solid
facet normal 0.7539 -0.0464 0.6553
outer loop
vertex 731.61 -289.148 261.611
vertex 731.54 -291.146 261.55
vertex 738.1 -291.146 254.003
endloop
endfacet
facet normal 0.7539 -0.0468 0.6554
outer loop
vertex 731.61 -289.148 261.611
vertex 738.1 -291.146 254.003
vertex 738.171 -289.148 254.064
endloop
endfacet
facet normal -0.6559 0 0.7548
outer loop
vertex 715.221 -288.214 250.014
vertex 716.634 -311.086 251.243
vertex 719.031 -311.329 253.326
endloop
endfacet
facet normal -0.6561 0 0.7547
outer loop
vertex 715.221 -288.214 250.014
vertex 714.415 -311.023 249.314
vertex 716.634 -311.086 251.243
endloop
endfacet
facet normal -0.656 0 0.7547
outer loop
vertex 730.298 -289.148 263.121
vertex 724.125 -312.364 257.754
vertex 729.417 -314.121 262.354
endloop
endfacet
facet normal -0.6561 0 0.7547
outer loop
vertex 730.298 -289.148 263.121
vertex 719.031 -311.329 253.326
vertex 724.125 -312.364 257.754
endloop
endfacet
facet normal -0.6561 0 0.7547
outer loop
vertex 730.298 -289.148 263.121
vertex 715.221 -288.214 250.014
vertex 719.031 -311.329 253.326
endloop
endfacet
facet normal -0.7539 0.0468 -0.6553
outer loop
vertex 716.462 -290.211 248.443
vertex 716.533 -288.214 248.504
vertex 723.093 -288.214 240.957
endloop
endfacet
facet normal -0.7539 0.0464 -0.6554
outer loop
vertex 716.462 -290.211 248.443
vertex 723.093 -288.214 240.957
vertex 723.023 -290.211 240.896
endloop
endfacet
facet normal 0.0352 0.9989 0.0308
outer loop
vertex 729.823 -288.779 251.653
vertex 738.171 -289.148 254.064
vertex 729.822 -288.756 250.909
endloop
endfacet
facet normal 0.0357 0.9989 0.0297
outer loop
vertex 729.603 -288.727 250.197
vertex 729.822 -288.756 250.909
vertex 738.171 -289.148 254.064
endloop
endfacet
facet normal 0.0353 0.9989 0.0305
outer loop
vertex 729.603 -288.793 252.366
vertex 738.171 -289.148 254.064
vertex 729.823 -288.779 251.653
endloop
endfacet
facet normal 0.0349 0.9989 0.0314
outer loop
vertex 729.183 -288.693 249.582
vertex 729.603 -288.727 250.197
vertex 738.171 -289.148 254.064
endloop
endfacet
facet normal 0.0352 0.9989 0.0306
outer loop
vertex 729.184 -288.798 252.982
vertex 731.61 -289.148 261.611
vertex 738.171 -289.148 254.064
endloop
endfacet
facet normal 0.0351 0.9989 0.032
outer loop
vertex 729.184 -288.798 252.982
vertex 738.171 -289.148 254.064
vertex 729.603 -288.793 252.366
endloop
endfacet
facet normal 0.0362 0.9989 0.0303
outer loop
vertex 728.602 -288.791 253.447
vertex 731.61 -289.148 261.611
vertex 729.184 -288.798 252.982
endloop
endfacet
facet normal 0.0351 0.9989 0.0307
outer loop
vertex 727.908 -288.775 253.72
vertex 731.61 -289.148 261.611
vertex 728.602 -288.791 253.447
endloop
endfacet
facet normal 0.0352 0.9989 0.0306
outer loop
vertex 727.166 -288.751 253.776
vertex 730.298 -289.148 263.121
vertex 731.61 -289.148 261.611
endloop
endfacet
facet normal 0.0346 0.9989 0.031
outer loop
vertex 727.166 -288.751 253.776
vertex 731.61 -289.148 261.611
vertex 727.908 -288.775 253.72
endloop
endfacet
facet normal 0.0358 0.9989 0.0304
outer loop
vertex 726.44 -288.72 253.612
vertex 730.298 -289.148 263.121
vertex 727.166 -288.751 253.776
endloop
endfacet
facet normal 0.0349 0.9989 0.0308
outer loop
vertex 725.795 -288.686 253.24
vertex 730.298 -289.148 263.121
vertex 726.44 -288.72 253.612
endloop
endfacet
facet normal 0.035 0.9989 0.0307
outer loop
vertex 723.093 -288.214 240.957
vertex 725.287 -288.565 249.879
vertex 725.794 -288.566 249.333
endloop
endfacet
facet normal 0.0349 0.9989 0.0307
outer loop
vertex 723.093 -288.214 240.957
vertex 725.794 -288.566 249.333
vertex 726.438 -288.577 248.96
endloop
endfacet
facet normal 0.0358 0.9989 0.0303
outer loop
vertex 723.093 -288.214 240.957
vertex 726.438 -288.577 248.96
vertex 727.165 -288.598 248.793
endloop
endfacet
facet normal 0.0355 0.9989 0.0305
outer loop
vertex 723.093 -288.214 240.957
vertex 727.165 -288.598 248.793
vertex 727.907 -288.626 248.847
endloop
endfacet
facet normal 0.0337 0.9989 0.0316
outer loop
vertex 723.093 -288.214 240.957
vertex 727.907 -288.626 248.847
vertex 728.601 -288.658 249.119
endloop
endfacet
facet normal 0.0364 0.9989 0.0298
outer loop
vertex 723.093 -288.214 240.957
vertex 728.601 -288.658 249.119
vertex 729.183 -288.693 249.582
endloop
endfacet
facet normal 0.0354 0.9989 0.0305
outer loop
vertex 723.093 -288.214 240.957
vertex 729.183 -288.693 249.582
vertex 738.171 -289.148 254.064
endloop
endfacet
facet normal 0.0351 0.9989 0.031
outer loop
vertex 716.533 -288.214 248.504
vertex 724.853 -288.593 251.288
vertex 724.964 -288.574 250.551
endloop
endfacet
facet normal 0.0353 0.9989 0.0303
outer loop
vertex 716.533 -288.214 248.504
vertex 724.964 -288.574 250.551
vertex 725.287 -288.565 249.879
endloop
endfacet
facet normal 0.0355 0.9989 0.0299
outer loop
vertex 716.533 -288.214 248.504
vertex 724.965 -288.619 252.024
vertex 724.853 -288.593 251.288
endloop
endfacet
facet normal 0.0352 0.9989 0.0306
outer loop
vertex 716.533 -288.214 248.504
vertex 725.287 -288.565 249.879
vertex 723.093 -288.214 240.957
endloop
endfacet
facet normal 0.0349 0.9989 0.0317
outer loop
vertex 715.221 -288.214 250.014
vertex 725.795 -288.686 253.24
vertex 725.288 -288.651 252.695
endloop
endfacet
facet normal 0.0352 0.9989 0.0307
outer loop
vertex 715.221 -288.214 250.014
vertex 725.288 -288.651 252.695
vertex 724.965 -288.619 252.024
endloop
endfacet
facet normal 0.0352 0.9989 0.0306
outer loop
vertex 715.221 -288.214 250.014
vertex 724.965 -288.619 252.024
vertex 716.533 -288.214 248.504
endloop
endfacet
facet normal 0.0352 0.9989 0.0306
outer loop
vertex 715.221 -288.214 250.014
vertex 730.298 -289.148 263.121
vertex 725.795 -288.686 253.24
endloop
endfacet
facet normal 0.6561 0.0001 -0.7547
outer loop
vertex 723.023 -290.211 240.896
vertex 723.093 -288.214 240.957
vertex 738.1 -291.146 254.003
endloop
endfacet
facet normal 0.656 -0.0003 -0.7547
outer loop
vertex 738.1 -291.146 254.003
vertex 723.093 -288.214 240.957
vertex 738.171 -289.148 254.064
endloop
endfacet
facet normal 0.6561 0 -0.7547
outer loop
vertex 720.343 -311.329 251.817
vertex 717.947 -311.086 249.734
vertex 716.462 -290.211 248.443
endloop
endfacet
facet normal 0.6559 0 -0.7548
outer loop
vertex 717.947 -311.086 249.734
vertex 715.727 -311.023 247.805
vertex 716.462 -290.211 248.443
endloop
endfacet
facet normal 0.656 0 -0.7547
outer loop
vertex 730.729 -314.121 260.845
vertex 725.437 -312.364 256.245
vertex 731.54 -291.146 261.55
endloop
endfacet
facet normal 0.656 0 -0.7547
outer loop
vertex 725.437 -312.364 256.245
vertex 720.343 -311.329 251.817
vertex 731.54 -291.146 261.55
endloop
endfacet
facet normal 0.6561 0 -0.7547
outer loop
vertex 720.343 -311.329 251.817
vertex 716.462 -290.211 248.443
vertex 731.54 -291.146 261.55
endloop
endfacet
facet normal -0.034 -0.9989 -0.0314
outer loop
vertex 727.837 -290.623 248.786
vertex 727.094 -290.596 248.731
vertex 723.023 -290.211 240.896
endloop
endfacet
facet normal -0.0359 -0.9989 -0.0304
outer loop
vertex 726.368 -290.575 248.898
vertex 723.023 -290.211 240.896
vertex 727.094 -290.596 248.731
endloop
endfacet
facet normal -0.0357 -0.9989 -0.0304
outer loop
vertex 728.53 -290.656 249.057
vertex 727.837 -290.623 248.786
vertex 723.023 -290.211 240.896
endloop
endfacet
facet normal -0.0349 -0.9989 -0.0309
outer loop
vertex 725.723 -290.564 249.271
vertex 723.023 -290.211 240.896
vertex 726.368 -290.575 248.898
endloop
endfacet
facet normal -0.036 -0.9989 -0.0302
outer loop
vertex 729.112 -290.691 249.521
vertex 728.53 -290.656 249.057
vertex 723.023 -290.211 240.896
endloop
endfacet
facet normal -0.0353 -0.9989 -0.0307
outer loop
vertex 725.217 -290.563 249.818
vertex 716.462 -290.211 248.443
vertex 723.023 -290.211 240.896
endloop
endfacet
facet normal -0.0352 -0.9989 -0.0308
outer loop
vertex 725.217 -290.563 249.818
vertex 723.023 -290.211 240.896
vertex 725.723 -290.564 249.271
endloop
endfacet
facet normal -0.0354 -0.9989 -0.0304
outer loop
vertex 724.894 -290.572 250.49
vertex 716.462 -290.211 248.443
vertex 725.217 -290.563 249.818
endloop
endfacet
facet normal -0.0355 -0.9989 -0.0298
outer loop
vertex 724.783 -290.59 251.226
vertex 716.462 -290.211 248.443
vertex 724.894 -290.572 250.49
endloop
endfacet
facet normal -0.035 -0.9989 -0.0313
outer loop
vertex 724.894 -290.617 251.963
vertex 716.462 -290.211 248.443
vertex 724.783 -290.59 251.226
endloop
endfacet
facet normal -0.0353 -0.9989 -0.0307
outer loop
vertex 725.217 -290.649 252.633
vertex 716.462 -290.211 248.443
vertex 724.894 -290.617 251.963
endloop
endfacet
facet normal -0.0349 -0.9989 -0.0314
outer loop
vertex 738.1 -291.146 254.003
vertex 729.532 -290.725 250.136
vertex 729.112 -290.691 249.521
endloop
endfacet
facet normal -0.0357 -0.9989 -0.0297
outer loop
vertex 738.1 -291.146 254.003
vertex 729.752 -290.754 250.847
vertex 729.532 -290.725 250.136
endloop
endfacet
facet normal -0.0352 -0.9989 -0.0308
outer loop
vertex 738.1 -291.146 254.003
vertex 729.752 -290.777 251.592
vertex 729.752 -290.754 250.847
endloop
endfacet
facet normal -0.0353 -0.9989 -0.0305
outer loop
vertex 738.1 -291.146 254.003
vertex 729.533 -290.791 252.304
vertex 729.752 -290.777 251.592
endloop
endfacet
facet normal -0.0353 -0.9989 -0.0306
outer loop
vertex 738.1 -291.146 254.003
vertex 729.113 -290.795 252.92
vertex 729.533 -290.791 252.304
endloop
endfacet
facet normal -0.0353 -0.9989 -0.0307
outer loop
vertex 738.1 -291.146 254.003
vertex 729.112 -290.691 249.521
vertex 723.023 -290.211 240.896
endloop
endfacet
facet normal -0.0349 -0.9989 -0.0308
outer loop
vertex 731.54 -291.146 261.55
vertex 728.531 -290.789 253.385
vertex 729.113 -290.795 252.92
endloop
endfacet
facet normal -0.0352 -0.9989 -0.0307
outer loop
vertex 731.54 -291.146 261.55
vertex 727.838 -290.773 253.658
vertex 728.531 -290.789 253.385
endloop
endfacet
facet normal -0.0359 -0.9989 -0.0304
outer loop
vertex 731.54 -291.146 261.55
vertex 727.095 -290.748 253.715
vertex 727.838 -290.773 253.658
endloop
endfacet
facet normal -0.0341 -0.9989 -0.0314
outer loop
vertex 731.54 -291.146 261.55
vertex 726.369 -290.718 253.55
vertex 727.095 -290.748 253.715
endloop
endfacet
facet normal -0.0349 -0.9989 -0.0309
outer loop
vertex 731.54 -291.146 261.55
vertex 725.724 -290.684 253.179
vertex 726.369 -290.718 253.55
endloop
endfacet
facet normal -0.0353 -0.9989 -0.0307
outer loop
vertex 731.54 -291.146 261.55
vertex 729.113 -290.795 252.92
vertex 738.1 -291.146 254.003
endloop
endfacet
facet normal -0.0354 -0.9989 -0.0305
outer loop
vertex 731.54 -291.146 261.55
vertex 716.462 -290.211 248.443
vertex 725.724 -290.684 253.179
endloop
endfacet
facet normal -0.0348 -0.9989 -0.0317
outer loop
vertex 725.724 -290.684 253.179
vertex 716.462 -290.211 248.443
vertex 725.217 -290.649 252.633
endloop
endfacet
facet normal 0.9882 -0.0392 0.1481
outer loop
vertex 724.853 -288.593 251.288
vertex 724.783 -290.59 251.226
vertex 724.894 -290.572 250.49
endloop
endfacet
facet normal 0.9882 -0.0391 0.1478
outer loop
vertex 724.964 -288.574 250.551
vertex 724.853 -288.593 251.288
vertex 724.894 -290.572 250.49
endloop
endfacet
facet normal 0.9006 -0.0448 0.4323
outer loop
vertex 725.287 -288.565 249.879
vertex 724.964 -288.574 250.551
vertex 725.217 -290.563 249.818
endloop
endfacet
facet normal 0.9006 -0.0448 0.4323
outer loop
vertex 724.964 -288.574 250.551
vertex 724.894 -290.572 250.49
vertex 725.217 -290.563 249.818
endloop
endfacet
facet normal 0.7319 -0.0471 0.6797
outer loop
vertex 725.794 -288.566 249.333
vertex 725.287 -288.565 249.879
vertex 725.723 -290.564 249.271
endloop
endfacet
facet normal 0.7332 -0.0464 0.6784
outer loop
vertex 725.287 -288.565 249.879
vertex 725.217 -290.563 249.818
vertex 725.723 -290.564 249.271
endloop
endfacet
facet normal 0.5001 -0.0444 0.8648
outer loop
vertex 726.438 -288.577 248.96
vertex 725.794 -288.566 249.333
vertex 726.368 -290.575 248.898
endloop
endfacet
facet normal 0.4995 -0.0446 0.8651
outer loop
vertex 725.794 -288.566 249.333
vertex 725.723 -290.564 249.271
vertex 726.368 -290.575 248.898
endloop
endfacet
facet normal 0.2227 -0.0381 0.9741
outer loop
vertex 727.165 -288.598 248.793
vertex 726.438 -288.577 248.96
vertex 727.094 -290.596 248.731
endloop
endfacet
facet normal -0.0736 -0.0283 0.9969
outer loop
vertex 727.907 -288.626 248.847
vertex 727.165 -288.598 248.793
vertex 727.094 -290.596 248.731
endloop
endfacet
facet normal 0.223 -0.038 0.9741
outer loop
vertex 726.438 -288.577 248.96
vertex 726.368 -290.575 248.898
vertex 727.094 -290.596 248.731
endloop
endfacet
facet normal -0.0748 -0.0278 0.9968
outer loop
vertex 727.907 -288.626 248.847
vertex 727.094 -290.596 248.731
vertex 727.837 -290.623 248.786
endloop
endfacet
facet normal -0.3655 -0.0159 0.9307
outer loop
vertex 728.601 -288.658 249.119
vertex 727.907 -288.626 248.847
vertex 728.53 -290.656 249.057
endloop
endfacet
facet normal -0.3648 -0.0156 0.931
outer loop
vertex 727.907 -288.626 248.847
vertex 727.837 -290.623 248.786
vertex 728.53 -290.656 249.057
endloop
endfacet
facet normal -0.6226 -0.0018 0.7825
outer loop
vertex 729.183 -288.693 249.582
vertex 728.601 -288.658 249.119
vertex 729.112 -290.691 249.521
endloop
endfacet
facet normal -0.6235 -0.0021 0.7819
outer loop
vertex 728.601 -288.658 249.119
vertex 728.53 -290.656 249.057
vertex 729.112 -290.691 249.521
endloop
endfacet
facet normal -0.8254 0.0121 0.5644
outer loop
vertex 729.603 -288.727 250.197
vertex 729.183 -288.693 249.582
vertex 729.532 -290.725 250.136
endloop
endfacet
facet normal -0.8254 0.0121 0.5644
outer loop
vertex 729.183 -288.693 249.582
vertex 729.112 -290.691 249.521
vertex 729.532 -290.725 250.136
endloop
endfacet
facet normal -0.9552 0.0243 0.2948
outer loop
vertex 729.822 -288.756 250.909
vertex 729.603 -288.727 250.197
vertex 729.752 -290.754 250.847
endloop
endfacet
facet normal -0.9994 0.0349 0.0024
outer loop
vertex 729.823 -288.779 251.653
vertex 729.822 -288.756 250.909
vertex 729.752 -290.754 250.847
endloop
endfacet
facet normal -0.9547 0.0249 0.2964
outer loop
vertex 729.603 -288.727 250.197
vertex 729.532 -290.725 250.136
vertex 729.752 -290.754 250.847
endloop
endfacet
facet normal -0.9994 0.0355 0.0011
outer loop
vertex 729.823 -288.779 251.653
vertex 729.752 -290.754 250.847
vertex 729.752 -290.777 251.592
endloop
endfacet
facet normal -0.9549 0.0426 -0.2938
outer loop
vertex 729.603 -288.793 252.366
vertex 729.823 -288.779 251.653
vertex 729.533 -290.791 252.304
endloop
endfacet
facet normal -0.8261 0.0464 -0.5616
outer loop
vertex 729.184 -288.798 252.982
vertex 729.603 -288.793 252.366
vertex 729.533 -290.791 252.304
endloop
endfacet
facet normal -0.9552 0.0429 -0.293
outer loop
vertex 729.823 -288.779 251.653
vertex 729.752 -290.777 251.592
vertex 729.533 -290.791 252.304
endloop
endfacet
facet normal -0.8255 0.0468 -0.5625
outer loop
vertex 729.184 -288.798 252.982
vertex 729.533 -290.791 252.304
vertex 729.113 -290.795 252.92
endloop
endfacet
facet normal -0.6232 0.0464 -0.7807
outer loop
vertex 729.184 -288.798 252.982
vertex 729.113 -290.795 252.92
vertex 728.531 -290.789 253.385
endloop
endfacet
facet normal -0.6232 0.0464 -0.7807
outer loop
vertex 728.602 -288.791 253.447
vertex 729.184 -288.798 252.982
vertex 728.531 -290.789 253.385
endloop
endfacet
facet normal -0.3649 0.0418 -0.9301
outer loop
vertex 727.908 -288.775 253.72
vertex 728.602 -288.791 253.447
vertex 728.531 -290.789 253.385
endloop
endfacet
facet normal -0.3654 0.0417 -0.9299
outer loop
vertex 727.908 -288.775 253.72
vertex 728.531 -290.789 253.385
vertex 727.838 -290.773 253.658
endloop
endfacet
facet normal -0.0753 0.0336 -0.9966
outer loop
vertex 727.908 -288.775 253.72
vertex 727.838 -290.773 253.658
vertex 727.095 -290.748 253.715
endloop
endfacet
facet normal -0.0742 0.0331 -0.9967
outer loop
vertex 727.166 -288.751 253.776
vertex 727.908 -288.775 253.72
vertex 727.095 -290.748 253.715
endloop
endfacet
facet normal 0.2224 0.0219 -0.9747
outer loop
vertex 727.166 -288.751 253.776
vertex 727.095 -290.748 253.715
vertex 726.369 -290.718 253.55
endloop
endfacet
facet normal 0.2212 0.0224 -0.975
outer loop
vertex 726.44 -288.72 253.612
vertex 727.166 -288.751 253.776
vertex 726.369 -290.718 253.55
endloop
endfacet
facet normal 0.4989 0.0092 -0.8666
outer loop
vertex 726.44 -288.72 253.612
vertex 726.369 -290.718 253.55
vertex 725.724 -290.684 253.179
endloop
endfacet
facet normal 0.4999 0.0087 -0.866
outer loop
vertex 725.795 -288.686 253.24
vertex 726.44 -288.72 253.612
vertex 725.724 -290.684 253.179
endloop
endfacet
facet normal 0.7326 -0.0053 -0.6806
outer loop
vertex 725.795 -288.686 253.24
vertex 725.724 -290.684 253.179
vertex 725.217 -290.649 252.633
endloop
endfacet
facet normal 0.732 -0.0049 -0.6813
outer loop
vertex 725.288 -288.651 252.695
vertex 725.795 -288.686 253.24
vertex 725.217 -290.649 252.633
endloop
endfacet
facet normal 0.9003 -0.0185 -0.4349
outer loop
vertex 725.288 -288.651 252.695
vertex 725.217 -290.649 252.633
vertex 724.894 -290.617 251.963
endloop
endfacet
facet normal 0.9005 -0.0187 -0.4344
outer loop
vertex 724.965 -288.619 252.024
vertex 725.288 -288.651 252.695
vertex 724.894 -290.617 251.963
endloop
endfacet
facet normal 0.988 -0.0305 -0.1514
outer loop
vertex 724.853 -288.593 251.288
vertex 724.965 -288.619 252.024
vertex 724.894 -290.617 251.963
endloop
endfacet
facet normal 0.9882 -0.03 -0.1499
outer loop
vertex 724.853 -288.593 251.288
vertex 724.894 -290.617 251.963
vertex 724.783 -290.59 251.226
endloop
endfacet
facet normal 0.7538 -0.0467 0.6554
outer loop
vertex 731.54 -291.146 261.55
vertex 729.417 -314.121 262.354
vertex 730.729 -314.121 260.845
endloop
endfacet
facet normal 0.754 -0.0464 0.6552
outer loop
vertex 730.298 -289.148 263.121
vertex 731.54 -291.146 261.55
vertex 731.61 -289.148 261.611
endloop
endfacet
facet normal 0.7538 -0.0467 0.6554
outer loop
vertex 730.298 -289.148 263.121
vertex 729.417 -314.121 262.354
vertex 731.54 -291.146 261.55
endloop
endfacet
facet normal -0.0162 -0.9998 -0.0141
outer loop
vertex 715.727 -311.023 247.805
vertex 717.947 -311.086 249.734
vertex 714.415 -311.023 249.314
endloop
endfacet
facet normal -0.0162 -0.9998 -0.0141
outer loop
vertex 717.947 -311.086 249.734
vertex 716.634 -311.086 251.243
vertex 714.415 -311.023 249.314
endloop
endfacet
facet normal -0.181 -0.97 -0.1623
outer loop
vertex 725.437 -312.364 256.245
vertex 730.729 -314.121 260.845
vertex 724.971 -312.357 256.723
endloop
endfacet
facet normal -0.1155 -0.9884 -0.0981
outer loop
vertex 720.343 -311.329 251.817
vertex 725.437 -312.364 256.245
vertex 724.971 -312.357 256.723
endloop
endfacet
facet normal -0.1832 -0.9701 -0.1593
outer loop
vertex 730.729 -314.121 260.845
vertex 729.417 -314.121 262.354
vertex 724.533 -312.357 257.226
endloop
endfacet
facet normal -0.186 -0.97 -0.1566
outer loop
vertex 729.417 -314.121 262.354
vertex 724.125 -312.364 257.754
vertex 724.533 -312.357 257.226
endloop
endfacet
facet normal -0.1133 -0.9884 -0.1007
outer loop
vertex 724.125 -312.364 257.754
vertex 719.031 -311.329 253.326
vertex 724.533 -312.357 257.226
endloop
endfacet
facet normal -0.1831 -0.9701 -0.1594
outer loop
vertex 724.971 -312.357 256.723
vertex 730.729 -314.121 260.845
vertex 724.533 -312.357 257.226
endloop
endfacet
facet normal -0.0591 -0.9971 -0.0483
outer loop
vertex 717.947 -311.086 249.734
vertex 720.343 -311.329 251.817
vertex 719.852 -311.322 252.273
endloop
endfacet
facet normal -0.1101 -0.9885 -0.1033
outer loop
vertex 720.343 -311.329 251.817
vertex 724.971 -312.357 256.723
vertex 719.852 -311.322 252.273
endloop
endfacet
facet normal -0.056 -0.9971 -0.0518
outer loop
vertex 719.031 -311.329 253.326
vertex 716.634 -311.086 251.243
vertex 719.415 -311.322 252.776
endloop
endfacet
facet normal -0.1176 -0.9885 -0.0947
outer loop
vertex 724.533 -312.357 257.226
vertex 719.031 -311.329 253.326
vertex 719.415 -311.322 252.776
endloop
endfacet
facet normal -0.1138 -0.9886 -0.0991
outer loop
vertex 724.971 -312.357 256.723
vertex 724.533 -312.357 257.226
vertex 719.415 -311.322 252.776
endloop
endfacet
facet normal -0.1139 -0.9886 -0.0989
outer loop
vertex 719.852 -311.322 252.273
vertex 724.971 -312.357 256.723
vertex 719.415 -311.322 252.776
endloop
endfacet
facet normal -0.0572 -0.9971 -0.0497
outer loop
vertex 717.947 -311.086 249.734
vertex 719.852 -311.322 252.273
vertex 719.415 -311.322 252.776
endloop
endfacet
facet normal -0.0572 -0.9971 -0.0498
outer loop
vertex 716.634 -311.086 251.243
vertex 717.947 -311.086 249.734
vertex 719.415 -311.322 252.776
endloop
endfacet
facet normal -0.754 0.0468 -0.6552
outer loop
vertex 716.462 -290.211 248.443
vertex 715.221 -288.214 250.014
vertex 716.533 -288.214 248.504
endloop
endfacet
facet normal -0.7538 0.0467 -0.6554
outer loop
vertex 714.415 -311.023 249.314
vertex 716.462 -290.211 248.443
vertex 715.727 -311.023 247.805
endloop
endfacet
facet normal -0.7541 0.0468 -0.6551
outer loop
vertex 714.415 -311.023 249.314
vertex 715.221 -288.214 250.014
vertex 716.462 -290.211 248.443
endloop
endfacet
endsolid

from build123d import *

# Parameters (mm, degrees)
DODANIE_WYCI_GNI_CIE1_DEPTH       = 2
WYCI_GNI_CIE_CIENKA_CIANKA1_DEPTH = 10
SZKIC3_R                          = 2.5
WYTNIJ_WYCI_GNI_CIE1_DEPTH        = 10


with BuildPart() as part:
    # Szkic1 → Dodanie-wyciągnięcie1 (new body)
    with BuildSketch(Plane(origin=(184.050171811, 0, -211.725502995), x_dir=(-0.75470958, 0, -0.656059029), z_dir=(0.656059029, 0, -0.75470958))):
        with BuildLine():
            Line((-722.617736481, -314.120725024), (-723.785887875, -289.14803149))
            Line((-723.785887875, -289.14803149), (-703.807733048, -288.213510375))
            Line((-703.807733048, -288.213510375), (-702.74076796, -311.023047123))
            add(Edge.make_bspline(
                [(-722.617736481, -314.120725024), (-715.581558407, -312.012536185), (-708.710440218, -310.976356299), (-702.74076796, -311.023047123)],
                knots=[0.744519777, 0.744519777, 0.744519777, 0.744519777, 0.831521887, 0.831521887, 0.831521887, 0.831521887], degree=3, weights=[0.500240263, 0.497697377, 0.515339471, 0.553166544]))
        make_face()
    extrude(amount=DODANIE_WYCI_GNI_CIE1_DEPTH)

    # Szkic2 → Wyciągnięcie-cienka ścianka1 (add)
    with BuildSketch(Plane(origin=(185.362289869, 0, -213.234922155), x_dir=(-0.75470958, 0, -0.656059029), z_dir=(0.656059029, 0, -0.75470958))):
        Polygon((-723.785887875, -289.14803149), (-703.807733048, -288.213510375), (-703.714280936, -290.211325858), (-723.692435763, -291.145846973), align=None)
    extrude(amount=WYCI_GNI_CIE_CIENKA_CIANKA1_DEPTH)

    # Szkic3 → Wytnij-wyciągnięcie1 (cut)
    with BuildSketch(Plane(origin=(-9.063445171, -256.731823112, -7.878732686), x_dir=(-0.999377978, 0.035240125, 0.001338532), z_dir=(-0.035264602, -0.998907741, -0.030655051))):
        with Locations((-736.736241375, -260.210465694)):
            Circle(SZKIC3_R)
    extrude(amount=-WYTNIJ_WYCI_GNI_CIE1_DEPTH, mode=Mode.SUBTRACT)


solid = part.part
